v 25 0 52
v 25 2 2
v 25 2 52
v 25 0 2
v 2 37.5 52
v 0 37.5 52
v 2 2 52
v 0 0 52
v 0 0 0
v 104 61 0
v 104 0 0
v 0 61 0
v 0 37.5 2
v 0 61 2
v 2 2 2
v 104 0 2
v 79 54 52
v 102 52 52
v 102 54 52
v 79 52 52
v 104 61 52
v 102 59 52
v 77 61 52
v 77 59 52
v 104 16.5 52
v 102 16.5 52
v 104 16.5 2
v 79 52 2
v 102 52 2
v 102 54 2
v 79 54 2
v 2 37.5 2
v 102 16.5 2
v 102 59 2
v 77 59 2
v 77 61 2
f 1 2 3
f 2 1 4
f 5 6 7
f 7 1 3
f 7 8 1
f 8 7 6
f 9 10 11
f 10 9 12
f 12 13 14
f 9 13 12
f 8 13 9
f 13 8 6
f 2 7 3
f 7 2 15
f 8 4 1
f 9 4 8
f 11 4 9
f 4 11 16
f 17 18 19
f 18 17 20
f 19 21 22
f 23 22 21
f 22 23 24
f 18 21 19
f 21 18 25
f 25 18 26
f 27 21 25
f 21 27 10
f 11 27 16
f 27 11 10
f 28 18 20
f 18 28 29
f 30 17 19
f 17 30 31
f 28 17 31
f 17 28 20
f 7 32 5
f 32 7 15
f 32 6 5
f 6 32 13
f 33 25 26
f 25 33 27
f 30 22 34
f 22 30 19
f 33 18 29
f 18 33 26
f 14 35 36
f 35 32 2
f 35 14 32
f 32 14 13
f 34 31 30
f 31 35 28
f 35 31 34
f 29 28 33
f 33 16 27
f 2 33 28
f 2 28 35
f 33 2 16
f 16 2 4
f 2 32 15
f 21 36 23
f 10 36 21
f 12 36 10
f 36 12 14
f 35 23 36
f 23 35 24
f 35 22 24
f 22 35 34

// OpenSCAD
// file: rotator.scad
module rotator(
    repeat = 0,
	center = [0, 0, 0]
){
    rotation = 360 / repeat;
    for (i=[0 : repeat])
	translate([
		center[0],
		center[1],
		center[2]
	])
    rotate([0, 0, rotation * i])
	translate([
		-center[0],
		-center[1],
		-center[2]
	])
    children();
}
// main file
//Paper holder by angsanch

/// Editable parameters

paper_width = 100;
paper_height = 50;
stack_height = 50;
notes_width = 5;
wall_width = 2;
fillet = 1;

use <./rotator.scad>;

module holder(
    paper_width = 100,
    paper_height = 50,
    stack_height = 50,
	notes_width = 5,
    wall_width = 2,
    fillet = 1,
){
    union() {
        //base
		cube([
            paper_width + (wall_width * 2),
            paper_height + notes_width + (wall_width * 3),
            wall_width,
        ]);

        //long walls
        rotator(2, [
            paper_width / 2 + wall_width,
            paper_height / 2 + wall_width,
            0,
		])
        cube([
			paper_width * 1 / 4,
            wall_width,
            stack_height + wall_width,
        ]);

        //short walls
        rotator(2, [
            paper_width / 2 + wall_width,
            paper_height / 2 + wall_width,
            0,
		])
        cube([
            wall_width,
            paper_height * 3 / 4,
            stack_height + wall_width,
        ]);
		
		// notes
        translate([
            paper_width + wall_width,
            paper_height + 2 * wall_width,
            0
        ])
		cube([
			wall_width,
			wall_width + notes_width,
			wall_width + stack_height,
		]);
		
		let(width=paper_width * 1 / 4)
        translate([
            paper_width + wall_width - width,
            paper_height + notes_width + 2 * wall_width,
            0
        ])
        cube([
            width,
            wall_width,
            stack_height + wall_width,
        ]);
    }
}

$fn = $preview ? 16 : 64;
holder(paper_width, paper_height, stack_height, notes_width, wall_width, fillet);
